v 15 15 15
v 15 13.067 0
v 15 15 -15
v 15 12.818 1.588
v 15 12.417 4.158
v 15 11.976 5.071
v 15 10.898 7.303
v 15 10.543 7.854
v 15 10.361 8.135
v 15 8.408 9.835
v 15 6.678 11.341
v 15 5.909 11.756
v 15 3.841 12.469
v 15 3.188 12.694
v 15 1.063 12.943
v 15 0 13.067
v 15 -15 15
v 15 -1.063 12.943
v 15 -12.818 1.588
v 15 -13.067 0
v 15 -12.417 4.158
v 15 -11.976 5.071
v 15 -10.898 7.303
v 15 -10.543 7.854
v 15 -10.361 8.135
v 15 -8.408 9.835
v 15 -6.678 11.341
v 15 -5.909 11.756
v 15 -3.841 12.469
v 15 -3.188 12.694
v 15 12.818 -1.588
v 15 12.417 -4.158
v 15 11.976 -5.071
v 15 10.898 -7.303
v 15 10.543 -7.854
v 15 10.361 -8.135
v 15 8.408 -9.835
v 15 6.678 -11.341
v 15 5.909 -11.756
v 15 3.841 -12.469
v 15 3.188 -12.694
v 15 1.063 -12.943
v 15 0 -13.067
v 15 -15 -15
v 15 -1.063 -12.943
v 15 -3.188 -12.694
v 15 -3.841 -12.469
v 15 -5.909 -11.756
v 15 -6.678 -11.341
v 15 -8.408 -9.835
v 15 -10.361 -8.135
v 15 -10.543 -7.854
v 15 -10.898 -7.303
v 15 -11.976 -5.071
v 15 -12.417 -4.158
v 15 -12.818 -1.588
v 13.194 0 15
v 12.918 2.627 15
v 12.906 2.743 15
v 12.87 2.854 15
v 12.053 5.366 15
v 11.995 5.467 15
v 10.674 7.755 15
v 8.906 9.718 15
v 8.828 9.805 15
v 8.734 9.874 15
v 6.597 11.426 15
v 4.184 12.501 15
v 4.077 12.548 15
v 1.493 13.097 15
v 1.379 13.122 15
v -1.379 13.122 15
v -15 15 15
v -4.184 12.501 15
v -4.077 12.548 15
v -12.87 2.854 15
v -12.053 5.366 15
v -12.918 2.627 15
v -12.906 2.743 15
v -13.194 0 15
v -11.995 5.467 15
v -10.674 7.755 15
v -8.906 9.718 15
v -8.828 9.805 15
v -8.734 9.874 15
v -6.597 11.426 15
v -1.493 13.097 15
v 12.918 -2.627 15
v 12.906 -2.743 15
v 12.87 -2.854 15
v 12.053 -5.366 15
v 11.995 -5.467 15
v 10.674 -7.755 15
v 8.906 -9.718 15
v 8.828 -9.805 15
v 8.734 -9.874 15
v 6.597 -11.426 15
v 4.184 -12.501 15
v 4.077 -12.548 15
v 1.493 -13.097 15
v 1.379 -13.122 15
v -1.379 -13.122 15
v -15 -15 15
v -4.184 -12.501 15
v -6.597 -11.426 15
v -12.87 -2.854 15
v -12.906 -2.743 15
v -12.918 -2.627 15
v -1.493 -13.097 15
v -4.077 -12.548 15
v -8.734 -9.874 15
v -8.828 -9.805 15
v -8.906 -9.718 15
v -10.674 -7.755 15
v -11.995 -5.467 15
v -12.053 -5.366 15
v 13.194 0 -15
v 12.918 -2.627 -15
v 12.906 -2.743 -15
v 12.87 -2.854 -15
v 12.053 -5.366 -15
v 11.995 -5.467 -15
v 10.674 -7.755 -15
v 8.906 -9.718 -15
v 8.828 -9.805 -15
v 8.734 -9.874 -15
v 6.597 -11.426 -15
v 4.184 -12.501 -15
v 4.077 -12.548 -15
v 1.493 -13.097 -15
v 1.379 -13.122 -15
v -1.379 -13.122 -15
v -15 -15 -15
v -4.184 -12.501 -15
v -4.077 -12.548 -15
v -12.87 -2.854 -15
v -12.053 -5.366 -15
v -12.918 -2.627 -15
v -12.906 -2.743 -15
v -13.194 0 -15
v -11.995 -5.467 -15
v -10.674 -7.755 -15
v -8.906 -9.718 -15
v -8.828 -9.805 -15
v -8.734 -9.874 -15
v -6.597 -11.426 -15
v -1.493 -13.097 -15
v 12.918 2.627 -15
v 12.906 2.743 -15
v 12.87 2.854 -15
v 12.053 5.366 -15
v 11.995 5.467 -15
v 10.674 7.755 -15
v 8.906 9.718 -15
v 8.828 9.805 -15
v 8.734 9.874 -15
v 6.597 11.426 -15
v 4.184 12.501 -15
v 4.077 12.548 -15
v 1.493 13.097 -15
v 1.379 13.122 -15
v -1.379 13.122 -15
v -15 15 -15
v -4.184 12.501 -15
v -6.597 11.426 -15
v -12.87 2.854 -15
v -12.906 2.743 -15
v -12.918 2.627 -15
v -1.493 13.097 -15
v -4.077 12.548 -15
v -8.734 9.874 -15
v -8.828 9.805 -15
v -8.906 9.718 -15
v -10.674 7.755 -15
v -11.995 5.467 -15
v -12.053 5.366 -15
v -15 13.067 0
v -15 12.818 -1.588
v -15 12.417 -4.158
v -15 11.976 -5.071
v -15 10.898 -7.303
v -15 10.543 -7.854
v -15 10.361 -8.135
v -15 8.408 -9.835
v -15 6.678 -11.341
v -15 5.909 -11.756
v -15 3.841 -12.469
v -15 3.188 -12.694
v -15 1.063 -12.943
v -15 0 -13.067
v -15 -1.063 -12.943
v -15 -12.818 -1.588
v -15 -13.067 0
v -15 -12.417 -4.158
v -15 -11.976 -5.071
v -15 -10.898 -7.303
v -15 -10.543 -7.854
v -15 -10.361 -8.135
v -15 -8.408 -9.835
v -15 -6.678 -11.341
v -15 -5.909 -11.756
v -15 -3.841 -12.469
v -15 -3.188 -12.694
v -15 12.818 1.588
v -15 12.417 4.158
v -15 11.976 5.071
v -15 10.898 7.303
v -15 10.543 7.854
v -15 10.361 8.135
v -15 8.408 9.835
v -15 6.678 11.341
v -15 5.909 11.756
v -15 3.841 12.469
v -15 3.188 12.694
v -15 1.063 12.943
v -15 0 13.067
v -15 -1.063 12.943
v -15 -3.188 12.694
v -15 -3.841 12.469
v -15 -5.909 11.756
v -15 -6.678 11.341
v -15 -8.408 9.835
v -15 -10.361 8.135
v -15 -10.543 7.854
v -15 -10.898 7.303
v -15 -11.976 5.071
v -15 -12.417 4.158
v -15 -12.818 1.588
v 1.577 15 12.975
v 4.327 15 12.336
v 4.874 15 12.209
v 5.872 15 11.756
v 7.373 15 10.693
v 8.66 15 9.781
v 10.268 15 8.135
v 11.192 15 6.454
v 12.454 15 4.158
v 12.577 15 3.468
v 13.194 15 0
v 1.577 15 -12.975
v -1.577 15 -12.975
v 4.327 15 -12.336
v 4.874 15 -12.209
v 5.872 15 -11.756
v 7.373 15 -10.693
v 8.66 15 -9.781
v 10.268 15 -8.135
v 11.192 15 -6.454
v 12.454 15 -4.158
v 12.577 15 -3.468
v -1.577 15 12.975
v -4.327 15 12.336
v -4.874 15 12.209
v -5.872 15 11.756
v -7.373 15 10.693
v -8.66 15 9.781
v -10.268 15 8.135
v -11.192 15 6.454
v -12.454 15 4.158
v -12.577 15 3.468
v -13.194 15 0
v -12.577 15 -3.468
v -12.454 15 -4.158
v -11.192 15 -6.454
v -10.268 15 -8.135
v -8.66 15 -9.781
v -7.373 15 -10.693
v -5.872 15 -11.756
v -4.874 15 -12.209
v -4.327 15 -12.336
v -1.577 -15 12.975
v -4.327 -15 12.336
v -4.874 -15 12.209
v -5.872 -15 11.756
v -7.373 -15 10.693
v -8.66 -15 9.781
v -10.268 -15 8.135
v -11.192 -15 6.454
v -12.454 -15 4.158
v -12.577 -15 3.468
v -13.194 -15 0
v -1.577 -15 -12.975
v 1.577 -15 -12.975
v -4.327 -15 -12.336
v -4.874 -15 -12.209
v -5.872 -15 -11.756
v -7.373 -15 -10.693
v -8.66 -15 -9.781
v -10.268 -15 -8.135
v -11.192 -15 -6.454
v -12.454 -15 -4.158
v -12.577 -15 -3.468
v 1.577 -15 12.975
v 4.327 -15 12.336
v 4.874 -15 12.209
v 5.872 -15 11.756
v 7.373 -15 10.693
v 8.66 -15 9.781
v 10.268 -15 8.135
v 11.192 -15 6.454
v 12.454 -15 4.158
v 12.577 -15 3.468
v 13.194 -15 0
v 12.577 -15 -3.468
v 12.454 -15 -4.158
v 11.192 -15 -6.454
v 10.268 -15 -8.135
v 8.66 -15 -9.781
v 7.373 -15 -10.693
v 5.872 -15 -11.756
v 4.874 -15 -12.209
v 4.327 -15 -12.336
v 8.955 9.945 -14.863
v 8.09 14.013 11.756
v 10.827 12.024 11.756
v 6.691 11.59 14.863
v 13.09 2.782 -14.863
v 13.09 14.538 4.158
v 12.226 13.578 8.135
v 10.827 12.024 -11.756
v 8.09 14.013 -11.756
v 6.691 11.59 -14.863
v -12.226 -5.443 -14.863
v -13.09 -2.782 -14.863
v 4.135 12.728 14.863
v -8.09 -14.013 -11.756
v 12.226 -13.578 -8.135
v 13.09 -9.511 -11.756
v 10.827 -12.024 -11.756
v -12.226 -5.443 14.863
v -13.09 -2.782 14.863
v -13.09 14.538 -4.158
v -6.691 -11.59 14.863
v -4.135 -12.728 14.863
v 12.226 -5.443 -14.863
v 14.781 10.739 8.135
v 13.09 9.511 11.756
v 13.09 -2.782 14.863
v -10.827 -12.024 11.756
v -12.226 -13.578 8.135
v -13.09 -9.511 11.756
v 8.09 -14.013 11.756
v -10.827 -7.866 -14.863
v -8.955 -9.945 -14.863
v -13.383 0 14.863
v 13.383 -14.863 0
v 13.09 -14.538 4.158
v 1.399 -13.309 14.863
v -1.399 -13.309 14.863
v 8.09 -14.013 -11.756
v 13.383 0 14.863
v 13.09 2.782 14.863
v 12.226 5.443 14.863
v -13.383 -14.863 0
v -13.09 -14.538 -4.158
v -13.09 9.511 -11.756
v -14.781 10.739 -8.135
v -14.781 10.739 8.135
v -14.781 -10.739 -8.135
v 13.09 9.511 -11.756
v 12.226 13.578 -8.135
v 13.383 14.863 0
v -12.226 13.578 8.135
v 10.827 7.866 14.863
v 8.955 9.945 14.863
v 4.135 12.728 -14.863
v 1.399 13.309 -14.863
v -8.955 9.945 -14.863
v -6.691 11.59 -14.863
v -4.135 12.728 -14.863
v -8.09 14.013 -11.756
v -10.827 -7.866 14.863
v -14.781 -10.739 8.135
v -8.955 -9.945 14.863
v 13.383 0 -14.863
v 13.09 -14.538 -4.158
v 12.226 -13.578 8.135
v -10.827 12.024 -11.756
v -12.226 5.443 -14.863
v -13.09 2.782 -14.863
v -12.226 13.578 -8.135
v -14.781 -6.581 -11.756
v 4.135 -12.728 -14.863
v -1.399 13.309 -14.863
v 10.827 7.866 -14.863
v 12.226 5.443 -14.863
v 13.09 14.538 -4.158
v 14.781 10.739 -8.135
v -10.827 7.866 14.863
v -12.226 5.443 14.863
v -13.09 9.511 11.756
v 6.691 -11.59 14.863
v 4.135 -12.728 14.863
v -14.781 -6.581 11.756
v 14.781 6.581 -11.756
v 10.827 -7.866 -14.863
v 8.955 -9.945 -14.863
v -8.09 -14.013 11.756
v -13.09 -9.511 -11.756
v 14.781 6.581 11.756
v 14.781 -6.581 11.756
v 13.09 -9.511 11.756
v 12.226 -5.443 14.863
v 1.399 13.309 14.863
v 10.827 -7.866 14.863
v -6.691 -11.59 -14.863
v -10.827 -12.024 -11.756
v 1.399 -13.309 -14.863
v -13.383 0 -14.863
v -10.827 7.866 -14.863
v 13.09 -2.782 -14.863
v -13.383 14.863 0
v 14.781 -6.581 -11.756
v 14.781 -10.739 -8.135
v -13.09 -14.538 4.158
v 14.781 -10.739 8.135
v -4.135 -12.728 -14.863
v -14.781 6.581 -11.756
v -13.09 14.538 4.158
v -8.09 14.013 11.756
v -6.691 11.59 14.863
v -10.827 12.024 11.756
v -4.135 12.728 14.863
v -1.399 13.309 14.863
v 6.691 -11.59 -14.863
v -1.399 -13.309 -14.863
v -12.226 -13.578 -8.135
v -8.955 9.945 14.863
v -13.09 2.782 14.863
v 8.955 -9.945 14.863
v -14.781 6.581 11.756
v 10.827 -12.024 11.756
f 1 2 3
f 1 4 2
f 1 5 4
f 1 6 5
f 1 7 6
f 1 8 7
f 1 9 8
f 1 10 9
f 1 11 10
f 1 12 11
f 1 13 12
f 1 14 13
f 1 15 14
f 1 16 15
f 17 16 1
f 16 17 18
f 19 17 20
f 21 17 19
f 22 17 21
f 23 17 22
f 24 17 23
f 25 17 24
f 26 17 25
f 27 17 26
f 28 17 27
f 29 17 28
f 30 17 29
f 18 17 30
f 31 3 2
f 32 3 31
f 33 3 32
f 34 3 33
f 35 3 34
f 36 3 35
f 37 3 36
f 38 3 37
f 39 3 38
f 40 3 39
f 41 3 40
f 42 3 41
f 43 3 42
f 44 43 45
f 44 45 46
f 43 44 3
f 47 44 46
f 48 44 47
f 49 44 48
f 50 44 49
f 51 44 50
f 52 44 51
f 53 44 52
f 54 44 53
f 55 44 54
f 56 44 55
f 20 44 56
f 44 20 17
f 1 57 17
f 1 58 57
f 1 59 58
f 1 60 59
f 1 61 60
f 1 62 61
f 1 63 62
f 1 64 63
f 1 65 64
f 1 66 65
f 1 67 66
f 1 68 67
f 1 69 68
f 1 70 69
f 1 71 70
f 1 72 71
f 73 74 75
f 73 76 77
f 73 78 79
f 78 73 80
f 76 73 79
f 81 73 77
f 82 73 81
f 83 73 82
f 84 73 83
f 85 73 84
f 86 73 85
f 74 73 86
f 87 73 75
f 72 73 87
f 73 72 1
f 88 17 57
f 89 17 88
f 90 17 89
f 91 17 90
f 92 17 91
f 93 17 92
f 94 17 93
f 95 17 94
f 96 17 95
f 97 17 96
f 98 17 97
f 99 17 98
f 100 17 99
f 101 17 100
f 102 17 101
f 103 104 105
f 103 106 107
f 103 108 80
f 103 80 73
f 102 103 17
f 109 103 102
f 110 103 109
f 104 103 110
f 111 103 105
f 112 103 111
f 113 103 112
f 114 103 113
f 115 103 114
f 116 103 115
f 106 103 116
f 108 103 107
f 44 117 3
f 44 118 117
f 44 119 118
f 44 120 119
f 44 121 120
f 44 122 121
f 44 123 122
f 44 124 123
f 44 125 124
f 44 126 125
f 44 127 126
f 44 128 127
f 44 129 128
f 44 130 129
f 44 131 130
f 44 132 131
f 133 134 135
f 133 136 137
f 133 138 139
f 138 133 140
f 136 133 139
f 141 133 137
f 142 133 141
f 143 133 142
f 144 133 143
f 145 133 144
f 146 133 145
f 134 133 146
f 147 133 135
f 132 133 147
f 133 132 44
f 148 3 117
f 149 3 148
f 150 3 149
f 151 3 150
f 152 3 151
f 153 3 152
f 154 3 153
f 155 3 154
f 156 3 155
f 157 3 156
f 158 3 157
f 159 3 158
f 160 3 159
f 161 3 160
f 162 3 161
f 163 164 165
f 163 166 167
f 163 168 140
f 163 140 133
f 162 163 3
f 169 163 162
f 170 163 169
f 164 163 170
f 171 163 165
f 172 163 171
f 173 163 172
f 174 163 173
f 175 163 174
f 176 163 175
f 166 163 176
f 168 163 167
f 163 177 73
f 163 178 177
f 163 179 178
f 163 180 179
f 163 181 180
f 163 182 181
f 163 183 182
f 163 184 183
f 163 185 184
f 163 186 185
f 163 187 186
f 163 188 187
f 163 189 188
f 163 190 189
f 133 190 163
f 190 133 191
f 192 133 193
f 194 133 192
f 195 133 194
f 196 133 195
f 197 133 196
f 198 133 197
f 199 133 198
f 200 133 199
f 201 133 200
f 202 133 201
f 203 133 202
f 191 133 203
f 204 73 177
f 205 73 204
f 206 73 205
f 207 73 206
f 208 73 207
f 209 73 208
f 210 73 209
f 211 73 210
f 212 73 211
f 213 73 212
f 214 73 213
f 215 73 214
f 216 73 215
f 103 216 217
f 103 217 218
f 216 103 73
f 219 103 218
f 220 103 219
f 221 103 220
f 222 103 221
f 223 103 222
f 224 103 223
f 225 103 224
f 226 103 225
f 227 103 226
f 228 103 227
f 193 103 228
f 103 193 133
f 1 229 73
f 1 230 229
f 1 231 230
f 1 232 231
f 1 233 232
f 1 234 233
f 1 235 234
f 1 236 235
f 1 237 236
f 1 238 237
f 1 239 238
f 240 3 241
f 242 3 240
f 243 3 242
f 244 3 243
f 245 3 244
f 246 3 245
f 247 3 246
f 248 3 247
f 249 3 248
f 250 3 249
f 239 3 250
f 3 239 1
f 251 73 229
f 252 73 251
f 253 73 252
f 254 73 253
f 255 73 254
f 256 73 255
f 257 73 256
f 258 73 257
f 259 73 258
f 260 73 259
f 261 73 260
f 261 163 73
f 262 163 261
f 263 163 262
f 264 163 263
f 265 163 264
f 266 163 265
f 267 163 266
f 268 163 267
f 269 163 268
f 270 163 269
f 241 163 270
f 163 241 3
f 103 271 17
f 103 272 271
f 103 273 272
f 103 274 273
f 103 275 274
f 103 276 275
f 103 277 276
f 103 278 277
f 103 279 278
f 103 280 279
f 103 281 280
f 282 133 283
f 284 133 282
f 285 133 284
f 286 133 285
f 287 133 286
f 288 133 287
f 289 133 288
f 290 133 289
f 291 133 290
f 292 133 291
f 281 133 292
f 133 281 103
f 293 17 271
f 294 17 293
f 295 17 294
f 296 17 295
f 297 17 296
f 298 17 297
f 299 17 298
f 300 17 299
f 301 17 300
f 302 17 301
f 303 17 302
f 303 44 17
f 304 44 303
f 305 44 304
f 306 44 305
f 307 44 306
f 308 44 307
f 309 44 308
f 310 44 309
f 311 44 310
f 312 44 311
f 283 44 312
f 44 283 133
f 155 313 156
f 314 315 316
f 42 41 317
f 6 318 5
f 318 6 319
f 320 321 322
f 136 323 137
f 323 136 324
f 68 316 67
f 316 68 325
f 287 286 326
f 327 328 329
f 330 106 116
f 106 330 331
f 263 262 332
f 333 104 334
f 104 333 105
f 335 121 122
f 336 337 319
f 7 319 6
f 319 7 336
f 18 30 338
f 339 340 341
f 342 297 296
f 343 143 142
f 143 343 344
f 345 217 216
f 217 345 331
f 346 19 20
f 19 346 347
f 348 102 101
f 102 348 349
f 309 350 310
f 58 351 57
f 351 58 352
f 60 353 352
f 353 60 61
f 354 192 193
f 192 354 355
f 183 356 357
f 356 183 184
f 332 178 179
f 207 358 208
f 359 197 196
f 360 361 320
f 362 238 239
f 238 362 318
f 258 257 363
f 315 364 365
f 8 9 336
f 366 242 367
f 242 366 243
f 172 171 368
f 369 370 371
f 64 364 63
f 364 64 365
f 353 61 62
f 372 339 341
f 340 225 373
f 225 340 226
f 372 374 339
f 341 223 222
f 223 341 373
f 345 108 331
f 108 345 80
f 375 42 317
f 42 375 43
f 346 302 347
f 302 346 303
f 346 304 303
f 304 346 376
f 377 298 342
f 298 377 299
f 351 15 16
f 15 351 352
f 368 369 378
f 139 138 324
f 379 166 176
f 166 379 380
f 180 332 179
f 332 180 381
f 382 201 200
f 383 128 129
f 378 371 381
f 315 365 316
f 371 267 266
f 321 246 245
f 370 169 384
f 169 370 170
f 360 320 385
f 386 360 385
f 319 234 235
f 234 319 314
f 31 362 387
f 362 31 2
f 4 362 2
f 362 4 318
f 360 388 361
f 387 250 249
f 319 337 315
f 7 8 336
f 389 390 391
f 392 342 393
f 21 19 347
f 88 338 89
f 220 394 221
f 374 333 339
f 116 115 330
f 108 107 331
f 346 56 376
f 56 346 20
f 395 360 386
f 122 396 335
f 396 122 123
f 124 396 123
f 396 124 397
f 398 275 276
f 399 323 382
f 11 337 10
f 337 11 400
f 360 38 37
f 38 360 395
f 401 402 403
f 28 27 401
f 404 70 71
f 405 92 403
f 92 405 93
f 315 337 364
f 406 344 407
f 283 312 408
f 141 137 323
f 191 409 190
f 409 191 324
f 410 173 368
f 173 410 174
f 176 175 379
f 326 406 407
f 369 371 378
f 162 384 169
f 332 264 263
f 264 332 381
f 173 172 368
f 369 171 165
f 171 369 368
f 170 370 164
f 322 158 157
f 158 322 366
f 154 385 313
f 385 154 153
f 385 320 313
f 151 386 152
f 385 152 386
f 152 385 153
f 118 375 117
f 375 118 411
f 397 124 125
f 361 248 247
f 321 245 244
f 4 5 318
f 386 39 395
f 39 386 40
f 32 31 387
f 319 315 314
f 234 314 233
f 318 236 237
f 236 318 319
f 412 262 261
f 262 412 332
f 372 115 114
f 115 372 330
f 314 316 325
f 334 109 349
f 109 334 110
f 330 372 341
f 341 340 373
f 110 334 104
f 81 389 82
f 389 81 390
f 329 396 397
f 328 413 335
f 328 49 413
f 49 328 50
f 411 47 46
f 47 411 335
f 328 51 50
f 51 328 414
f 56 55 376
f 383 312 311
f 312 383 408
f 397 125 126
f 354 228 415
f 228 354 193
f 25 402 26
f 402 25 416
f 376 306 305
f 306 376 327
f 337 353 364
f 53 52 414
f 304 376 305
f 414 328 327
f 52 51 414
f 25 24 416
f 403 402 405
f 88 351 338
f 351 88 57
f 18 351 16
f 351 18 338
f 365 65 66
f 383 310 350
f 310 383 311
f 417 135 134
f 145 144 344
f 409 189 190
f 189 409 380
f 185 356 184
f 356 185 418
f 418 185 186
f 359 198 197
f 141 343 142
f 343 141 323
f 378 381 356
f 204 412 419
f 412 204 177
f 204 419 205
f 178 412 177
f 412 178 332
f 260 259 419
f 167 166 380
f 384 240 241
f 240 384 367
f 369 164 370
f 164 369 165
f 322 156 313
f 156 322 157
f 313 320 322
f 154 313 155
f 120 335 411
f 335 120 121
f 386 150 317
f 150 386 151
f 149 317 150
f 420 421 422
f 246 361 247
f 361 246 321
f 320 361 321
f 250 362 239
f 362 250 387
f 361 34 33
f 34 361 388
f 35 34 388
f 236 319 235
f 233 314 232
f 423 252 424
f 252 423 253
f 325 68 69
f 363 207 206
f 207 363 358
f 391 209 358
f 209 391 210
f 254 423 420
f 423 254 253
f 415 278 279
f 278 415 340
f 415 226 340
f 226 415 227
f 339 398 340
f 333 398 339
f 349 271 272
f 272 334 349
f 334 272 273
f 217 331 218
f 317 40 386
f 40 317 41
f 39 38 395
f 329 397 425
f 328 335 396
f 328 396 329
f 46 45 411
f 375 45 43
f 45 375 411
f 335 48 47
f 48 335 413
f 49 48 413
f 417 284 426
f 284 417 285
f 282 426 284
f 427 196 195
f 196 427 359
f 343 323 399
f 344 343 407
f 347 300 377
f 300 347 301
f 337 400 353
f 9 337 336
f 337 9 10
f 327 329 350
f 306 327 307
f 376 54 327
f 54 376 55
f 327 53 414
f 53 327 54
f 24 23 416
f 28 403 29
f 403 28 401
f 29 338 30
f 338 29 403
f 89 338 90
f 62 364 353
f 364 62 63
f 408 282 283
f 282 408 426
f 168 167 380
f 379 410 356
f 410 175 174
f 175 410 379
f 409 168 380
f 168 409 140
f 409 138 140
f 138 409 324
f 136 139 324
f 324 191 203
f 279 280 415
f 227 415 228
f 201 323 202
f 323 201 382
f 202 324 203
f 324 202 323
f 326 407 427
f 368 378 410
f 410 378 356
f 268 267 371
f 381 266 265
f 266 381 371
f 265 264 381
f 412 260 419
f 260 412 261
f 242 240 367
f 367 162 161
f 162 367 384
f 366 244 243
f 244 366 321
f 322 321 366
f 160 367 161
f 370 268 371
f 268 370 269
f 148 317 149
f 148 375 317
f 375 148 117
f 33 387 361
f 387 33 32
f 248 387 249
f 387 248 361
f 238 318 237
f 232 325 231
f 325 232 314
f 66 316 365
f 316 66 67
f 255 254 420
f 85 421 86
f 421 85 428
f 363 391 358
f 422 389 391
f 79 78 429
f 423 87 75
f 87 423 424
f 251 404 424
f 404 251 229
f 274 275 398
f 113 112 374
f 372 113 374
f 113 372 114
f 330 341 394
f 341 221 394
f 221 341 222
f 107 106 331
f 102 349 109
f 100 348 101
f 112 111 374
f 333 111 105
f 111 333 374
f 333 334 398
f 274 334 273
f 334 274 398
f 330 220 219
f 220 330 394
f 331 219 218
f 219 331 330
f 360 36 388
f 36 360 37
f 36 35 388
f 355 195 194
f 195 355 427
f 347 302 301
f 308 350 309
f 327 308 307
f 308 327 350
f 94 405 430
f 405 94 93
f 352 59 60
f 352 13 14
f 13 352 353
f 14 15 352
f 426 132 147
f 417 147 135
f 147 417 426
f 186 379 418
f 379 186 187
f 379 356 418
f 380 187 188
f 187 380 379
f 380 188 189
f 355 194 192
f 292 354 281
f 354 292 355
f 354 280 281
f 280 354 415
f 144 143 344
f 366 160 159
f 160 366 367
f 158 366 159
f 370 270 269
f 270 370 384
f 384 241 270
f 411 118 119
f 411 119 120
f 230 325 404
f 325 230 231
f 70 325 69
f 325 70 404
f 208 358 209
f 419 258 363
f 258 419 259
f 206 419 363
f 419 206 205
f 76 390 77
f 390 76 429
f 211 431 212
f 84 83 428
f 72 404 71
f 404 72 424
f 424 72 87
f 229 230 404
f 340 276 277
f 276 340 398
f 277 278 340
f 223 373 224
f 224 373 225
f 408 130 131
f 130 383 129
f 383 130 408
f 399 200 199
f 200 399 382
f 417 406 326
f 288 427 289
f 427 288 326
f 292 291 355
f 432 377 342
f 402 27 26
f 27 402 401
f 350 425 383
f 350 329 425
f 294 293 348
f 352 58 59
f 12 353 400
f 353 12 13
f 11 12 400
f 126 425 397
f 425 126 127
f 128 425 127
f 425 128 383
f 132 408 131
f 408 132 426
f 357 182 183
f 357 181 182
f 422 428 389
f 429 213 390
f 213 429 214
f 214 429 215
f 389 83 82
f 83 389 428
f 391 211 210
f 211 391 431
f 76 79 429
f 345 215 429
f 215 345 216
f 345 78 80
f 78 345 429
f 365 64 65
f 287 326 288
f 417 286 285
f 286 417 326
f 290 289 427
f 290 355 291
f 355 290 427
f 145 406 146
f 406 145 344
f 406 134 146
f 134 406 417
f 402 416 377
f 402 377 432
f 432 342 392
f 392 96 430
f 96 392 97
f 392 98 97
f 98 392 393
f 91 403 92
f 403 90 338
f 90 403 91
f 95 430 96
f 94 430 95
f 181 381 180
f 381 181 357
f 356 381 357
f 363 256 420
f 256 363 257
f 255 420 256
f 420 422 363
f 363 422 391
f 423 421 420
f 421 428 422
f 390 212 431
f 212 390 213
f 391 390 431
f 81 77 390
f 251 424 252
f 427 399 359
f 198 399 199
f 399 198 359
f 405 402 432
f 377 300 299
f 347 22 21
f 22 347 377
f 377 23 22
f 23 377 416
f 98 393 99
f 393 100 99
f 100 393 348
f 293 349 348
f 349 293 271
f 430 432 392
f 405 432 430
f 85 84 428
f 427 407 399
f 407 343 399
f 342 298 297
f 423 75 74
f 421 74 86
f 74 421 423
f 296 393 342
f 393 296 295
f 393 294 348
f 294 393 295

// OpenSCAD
module example004() {
    difference() {
        cube(30, center = true);
        sphere(20);
    }
}

echo(version = version());

example004();

// Written by Clifford Wolf <clifford@clifford.at> and Marius
// Kintel <marius@kintel.net>
//
// To the extent possible under law, the author(s) have dedicated all
// copyright and related and neighboring rights to this software to the
// public domain worldwide. This software is distributed without any
// warranty.
//
// You should have received a copy of the CC0 Public Domain
// Dedication along with this software.
// If not, see <http://creativecommons.org/publicdomain/zero/1.0/>.
